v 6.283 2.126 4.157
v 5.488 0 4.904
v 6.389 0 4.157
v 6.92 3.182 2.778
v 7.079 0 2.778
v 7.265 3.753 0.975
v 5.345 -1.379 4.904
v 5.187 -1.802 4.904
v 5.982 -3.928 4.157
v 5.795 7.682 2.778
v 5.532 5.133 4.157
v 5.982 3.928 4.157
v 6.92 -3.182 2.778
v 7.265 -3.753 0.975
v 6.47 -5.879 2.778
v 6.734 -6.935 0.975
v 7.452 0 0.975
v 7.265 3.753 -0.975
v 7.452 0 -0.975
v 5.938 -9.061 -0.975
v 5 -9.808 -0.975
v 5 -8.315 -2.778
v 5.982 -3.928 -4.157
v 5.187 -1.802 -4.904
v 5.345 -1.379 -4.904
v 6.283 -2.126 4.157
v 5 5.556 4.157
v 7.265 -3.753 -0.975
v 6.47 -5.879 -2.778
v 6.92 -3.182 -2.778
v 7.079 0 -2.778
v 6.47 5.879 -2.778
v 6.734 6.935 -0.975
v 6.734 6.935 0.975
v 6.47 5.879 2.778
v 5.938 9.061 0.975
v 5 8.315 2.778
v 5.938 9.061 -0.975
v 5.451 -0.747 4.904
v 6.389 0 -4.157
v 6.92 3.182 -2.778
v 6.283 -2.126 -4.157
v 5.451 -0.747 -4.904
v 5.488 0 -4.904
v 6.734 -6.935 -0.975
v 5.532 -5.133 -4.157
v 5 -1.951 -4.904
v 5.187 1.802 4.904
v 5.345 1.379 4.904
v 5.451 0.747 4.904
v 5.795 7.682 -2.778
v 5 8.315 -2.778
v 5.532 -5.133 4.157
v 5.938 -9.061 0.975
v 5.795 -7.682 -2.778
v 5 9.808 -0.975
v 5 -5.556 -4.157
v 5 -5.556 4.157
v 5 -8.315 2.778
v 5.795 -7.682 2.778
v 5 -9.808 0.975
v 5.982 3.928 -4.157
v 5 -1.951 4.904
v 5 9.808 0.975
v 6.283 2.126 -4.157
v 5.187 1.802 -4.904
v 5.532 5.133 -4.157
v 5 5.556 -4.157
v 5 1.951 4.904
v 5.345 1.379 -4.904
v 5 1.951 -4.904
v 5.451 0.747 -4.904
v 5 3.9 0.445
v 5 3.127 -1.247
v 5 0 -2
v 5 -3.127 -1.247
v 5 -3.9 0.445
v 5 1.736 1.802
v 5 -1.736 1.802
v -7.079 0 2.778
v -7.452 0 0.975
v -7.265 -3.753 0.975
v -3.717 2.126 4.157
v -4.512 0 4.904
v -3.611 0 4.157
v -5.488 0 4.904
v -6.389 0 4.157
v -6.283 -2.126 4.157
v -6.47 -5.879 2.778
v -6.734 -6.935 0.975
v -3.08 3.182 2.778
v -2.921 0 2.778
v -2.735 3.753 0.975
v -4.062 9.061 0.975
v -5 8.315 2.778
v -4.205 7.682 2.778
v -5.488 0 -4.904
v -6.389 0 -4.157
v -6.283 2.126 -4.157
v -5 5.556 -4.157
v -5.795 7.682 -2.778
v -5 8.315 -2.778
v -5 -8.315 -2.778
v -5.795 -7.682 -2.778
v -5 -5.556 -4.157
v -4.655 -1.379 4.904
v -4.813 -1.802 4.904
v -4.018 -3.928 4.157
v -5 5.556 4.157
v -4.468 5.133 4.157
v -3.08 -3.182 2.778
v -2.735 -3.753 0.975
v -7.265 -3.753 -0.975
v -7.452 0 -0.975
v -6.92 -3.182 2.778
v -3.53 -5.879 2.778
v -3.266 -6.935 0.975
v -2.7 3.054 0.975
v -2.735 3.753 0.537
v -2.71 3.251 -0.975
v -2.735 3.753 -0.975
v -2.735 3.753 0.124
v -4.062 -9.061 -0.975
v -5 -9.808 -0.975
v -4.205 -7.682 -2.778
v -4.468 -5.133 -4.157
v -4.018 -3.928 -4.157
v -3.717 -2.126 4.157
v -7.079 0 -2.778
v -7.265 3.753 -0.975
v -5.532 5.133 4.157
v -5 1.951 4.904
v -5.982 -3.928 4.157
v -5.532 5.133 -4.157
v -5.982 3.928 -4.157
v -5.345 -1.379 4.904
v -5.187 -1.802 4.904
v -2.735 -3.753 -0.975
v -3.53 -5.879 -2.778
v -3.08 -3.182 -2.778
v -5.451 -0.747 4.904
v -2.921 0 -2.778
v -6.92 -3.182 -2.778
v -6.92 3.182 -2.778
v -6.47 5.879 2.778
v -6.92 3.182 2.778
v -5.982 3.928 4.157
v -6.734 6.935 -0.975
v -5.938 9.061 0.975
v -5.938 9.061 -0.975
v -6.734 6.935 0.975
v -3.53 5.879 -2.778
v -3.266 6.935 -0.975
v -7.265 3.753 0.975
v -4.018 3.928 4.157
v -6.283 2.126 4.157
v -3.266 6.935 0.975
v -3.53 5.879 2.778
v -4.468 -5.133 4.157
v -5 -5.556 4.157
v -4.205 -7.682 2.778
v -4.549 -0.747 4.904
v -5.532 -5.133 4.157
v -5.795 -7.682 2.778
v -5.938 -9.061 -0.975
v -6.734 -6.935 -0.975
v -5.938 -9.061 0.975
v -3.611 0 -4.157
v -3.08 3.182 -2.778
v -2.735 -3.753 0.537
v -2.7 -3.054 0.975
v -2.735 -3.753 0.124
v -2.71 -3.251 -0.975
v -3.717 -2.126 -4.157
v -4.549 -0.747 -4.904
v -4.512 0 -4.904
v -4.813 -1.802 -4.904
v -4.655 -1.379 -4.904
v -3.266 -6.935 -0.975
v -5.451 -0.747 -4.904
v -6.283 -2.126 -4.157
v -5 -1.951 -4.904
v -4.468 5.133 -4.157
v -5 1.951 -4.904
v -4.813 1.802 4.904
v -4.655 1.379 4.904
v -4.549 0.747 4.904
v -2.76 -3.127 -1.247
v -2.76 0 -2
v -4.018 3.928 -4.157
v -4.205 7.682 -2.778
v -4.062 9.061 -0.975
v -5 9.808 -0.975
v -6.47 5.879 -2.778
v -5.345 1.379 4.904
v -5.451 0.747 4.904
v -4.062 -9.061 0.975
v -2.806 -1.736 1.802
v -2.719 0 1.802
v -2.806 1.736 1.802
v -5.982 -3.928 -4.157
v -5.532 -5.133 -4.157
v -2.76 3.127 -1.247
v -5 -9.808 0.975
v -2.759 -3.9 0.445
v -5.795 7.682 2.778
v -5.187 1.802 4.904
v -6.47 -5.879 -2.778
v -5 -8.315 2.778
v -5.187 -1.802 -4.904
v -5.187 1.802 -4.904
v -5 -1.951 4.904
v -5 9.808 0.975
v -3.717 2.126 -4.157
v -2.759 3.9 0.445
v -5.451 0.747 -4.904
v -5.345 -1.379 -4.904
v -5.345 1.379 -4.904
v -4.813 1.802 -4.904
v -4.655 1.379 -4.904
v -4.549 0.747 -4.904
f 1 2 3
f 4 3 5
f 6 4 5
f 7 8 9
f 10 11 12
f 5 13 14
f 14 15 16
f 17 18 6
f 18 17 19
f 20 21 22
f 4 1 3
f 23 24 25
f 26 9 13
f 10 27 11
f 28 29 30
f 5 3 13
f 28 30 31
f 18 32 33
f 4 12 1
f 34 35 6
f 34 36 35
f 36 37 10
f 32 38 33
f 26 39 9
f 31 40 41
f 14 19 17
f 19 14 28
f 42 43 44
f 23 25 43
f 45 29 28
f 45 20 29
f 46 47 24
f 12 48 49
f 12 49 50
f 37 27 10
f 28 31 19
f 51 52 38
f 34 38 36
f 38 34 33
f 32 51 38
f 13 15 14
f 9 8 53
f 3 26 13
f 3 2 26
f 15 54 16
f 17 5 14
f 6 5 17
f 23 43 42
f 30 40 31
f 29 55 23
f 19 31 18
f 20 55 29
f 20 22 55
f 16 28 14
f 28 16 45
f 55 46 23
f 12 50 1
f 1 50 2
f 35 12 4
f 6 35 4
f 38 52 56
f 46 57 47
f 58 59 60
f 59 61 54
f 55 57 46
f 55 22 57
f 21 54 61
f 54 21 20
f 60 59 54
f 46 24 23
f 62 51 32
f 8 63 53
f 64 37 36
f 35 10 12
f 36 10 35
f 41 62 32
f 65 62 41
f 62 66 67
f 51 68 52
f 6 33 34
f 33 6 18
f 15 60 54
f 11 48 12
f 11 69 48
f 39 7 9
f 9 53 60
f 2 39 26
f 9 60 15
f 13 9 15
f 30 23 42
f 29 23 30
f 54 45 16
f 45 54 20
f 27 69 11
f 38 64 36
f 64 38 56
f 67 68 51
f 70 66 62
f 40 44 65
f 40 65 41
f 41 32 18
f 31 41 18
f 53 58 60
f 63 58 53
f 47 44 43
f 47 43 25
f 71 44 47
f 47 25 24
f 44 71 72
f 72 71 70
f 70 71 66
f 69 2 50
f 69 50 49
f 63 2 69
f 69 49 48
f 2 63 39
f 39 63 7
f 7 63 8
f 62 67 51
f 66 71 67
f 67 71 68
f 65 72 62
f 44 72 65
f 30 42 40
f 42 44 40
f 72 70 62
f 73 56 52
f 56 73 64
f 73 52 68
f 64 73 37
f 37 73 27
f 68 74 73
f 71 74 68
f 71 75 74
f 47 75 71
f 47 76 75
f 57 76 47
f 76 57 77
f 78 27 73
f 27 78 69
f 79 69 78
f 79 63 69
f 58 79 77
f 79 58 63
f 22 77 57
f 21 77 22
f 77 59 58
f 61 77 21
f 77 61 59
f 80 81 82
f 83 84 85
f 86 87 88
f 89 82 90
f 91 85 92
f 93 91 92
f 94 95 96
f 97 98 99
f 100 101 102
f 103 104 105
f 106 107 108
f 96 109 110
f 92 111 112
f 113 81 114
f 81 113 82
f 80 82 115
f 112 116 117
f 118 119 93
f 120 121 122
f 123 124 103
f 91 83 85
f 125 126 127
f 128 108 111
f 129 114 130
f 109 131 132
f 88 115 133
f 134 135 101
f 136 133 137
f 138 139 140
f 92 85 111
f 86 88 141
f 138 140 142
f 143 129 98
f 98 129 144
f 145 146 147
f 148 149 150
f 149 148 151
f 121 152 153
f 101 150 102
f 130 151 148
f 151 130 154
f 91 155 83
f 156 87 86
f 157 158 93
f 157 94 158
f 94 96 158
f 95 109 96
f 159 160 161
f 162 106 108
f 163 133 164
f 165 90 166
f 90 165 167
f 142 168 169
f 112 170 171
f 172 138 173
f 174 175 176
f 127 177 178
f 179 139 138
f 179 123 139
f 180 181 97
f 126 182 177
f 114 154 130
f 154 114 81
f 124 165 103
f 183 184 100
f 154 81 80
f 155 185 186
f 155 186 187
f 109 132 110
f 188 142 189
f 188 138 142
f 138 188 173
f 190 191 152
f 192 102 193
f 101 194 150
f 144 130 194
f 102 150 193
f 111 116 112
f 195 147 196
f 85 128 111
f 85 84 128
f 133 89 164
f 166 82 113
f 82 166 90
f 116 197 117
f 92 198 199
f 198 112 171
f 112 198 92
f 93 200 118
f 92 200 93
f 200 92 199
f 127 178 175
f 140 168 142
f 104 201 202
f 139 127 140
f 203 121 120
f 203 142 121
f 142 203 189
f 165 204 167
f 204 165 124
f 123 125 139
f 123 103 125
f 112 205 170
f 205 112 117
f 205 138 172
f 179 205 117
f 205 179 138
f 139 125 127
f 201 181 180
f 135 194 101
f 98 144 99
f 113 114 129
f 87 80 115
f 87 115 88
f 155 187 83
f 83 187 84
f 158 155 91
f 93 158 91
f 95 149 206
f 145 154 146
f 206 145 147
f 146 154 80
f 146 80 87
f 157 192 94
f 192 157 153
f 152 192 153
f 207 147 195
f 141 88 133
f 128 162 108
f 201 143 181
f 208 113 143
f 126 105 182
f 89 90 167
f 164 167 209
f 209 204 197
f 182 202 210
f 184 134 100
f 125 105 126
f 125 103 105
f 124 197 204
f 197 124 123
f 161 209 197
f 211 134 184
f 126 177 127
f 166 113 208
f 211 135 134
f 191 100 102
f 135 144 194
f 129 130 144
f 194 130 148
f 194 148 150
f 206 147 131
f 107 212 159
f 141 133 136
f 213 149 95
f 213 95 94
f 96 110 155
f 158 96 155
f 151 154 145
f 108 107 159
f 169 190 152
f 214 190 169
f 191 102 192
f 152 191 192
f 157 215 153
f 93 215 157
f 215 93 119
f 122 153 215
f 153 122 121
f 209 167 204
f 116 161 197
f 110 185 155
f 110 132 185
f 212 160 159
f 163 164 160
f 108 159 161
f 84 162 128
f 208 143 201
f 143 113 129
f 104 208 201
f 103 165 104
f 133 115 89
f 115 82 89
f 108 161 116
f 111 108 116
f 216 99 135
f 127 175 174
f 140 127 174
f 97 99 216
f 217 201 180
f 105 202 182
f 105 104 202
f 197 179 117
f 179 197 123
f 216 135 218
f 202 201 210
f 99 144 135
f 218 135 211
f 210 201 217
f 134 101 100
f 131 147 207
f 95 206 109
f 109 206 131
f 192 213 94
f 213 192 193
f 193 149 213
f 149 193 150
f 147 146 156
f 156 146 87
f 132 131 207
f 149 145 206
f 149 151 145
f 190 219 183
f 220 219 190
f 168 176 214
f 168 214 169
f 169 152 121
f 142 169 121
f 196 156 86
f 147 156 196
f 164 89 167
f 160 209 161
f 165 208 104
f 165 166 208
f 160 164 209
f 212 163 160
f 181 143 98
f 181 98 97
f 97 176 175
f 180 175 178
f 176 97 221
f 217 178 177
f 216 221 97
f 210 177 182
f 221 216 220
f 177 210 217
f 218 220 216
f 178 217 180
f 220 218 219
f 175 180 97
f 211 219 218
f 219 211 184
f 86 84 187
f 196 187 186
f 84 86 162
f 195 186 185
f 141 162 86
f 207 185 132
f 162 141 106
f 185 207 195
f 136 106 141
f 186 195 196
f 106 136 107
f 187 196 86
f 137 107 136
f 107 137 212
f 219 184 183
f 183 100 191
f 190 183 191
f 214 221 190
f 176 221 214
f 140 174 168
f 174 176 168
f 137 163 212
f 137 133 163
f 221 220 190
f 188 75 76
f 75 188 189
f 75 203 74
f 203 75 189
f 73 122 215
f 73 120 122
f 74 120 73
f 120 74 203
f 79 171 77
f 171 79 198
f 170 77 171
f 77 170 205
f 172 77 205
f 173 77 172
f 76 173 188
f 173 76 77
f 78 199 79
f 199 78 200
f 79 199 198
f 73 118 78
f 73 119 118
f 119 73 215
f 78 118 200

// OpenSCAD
scale([.5,2,1])

union() {
//one weight
    translate([-10,0,0])
        difference() {  // cut weight in half
            sphere(r=5);
%           translate([0,-5,-5]) cube(10);
        }
// bar
    rotate([0,90,0]) cylinder(r=2,h=20, center=true);
// other weight
    translate([10,0,0])
        difference() { // cut weight in half in other direction
            sphere(r=5);
                translate([-10,-5,-5]) cube(10);
        }
} 
